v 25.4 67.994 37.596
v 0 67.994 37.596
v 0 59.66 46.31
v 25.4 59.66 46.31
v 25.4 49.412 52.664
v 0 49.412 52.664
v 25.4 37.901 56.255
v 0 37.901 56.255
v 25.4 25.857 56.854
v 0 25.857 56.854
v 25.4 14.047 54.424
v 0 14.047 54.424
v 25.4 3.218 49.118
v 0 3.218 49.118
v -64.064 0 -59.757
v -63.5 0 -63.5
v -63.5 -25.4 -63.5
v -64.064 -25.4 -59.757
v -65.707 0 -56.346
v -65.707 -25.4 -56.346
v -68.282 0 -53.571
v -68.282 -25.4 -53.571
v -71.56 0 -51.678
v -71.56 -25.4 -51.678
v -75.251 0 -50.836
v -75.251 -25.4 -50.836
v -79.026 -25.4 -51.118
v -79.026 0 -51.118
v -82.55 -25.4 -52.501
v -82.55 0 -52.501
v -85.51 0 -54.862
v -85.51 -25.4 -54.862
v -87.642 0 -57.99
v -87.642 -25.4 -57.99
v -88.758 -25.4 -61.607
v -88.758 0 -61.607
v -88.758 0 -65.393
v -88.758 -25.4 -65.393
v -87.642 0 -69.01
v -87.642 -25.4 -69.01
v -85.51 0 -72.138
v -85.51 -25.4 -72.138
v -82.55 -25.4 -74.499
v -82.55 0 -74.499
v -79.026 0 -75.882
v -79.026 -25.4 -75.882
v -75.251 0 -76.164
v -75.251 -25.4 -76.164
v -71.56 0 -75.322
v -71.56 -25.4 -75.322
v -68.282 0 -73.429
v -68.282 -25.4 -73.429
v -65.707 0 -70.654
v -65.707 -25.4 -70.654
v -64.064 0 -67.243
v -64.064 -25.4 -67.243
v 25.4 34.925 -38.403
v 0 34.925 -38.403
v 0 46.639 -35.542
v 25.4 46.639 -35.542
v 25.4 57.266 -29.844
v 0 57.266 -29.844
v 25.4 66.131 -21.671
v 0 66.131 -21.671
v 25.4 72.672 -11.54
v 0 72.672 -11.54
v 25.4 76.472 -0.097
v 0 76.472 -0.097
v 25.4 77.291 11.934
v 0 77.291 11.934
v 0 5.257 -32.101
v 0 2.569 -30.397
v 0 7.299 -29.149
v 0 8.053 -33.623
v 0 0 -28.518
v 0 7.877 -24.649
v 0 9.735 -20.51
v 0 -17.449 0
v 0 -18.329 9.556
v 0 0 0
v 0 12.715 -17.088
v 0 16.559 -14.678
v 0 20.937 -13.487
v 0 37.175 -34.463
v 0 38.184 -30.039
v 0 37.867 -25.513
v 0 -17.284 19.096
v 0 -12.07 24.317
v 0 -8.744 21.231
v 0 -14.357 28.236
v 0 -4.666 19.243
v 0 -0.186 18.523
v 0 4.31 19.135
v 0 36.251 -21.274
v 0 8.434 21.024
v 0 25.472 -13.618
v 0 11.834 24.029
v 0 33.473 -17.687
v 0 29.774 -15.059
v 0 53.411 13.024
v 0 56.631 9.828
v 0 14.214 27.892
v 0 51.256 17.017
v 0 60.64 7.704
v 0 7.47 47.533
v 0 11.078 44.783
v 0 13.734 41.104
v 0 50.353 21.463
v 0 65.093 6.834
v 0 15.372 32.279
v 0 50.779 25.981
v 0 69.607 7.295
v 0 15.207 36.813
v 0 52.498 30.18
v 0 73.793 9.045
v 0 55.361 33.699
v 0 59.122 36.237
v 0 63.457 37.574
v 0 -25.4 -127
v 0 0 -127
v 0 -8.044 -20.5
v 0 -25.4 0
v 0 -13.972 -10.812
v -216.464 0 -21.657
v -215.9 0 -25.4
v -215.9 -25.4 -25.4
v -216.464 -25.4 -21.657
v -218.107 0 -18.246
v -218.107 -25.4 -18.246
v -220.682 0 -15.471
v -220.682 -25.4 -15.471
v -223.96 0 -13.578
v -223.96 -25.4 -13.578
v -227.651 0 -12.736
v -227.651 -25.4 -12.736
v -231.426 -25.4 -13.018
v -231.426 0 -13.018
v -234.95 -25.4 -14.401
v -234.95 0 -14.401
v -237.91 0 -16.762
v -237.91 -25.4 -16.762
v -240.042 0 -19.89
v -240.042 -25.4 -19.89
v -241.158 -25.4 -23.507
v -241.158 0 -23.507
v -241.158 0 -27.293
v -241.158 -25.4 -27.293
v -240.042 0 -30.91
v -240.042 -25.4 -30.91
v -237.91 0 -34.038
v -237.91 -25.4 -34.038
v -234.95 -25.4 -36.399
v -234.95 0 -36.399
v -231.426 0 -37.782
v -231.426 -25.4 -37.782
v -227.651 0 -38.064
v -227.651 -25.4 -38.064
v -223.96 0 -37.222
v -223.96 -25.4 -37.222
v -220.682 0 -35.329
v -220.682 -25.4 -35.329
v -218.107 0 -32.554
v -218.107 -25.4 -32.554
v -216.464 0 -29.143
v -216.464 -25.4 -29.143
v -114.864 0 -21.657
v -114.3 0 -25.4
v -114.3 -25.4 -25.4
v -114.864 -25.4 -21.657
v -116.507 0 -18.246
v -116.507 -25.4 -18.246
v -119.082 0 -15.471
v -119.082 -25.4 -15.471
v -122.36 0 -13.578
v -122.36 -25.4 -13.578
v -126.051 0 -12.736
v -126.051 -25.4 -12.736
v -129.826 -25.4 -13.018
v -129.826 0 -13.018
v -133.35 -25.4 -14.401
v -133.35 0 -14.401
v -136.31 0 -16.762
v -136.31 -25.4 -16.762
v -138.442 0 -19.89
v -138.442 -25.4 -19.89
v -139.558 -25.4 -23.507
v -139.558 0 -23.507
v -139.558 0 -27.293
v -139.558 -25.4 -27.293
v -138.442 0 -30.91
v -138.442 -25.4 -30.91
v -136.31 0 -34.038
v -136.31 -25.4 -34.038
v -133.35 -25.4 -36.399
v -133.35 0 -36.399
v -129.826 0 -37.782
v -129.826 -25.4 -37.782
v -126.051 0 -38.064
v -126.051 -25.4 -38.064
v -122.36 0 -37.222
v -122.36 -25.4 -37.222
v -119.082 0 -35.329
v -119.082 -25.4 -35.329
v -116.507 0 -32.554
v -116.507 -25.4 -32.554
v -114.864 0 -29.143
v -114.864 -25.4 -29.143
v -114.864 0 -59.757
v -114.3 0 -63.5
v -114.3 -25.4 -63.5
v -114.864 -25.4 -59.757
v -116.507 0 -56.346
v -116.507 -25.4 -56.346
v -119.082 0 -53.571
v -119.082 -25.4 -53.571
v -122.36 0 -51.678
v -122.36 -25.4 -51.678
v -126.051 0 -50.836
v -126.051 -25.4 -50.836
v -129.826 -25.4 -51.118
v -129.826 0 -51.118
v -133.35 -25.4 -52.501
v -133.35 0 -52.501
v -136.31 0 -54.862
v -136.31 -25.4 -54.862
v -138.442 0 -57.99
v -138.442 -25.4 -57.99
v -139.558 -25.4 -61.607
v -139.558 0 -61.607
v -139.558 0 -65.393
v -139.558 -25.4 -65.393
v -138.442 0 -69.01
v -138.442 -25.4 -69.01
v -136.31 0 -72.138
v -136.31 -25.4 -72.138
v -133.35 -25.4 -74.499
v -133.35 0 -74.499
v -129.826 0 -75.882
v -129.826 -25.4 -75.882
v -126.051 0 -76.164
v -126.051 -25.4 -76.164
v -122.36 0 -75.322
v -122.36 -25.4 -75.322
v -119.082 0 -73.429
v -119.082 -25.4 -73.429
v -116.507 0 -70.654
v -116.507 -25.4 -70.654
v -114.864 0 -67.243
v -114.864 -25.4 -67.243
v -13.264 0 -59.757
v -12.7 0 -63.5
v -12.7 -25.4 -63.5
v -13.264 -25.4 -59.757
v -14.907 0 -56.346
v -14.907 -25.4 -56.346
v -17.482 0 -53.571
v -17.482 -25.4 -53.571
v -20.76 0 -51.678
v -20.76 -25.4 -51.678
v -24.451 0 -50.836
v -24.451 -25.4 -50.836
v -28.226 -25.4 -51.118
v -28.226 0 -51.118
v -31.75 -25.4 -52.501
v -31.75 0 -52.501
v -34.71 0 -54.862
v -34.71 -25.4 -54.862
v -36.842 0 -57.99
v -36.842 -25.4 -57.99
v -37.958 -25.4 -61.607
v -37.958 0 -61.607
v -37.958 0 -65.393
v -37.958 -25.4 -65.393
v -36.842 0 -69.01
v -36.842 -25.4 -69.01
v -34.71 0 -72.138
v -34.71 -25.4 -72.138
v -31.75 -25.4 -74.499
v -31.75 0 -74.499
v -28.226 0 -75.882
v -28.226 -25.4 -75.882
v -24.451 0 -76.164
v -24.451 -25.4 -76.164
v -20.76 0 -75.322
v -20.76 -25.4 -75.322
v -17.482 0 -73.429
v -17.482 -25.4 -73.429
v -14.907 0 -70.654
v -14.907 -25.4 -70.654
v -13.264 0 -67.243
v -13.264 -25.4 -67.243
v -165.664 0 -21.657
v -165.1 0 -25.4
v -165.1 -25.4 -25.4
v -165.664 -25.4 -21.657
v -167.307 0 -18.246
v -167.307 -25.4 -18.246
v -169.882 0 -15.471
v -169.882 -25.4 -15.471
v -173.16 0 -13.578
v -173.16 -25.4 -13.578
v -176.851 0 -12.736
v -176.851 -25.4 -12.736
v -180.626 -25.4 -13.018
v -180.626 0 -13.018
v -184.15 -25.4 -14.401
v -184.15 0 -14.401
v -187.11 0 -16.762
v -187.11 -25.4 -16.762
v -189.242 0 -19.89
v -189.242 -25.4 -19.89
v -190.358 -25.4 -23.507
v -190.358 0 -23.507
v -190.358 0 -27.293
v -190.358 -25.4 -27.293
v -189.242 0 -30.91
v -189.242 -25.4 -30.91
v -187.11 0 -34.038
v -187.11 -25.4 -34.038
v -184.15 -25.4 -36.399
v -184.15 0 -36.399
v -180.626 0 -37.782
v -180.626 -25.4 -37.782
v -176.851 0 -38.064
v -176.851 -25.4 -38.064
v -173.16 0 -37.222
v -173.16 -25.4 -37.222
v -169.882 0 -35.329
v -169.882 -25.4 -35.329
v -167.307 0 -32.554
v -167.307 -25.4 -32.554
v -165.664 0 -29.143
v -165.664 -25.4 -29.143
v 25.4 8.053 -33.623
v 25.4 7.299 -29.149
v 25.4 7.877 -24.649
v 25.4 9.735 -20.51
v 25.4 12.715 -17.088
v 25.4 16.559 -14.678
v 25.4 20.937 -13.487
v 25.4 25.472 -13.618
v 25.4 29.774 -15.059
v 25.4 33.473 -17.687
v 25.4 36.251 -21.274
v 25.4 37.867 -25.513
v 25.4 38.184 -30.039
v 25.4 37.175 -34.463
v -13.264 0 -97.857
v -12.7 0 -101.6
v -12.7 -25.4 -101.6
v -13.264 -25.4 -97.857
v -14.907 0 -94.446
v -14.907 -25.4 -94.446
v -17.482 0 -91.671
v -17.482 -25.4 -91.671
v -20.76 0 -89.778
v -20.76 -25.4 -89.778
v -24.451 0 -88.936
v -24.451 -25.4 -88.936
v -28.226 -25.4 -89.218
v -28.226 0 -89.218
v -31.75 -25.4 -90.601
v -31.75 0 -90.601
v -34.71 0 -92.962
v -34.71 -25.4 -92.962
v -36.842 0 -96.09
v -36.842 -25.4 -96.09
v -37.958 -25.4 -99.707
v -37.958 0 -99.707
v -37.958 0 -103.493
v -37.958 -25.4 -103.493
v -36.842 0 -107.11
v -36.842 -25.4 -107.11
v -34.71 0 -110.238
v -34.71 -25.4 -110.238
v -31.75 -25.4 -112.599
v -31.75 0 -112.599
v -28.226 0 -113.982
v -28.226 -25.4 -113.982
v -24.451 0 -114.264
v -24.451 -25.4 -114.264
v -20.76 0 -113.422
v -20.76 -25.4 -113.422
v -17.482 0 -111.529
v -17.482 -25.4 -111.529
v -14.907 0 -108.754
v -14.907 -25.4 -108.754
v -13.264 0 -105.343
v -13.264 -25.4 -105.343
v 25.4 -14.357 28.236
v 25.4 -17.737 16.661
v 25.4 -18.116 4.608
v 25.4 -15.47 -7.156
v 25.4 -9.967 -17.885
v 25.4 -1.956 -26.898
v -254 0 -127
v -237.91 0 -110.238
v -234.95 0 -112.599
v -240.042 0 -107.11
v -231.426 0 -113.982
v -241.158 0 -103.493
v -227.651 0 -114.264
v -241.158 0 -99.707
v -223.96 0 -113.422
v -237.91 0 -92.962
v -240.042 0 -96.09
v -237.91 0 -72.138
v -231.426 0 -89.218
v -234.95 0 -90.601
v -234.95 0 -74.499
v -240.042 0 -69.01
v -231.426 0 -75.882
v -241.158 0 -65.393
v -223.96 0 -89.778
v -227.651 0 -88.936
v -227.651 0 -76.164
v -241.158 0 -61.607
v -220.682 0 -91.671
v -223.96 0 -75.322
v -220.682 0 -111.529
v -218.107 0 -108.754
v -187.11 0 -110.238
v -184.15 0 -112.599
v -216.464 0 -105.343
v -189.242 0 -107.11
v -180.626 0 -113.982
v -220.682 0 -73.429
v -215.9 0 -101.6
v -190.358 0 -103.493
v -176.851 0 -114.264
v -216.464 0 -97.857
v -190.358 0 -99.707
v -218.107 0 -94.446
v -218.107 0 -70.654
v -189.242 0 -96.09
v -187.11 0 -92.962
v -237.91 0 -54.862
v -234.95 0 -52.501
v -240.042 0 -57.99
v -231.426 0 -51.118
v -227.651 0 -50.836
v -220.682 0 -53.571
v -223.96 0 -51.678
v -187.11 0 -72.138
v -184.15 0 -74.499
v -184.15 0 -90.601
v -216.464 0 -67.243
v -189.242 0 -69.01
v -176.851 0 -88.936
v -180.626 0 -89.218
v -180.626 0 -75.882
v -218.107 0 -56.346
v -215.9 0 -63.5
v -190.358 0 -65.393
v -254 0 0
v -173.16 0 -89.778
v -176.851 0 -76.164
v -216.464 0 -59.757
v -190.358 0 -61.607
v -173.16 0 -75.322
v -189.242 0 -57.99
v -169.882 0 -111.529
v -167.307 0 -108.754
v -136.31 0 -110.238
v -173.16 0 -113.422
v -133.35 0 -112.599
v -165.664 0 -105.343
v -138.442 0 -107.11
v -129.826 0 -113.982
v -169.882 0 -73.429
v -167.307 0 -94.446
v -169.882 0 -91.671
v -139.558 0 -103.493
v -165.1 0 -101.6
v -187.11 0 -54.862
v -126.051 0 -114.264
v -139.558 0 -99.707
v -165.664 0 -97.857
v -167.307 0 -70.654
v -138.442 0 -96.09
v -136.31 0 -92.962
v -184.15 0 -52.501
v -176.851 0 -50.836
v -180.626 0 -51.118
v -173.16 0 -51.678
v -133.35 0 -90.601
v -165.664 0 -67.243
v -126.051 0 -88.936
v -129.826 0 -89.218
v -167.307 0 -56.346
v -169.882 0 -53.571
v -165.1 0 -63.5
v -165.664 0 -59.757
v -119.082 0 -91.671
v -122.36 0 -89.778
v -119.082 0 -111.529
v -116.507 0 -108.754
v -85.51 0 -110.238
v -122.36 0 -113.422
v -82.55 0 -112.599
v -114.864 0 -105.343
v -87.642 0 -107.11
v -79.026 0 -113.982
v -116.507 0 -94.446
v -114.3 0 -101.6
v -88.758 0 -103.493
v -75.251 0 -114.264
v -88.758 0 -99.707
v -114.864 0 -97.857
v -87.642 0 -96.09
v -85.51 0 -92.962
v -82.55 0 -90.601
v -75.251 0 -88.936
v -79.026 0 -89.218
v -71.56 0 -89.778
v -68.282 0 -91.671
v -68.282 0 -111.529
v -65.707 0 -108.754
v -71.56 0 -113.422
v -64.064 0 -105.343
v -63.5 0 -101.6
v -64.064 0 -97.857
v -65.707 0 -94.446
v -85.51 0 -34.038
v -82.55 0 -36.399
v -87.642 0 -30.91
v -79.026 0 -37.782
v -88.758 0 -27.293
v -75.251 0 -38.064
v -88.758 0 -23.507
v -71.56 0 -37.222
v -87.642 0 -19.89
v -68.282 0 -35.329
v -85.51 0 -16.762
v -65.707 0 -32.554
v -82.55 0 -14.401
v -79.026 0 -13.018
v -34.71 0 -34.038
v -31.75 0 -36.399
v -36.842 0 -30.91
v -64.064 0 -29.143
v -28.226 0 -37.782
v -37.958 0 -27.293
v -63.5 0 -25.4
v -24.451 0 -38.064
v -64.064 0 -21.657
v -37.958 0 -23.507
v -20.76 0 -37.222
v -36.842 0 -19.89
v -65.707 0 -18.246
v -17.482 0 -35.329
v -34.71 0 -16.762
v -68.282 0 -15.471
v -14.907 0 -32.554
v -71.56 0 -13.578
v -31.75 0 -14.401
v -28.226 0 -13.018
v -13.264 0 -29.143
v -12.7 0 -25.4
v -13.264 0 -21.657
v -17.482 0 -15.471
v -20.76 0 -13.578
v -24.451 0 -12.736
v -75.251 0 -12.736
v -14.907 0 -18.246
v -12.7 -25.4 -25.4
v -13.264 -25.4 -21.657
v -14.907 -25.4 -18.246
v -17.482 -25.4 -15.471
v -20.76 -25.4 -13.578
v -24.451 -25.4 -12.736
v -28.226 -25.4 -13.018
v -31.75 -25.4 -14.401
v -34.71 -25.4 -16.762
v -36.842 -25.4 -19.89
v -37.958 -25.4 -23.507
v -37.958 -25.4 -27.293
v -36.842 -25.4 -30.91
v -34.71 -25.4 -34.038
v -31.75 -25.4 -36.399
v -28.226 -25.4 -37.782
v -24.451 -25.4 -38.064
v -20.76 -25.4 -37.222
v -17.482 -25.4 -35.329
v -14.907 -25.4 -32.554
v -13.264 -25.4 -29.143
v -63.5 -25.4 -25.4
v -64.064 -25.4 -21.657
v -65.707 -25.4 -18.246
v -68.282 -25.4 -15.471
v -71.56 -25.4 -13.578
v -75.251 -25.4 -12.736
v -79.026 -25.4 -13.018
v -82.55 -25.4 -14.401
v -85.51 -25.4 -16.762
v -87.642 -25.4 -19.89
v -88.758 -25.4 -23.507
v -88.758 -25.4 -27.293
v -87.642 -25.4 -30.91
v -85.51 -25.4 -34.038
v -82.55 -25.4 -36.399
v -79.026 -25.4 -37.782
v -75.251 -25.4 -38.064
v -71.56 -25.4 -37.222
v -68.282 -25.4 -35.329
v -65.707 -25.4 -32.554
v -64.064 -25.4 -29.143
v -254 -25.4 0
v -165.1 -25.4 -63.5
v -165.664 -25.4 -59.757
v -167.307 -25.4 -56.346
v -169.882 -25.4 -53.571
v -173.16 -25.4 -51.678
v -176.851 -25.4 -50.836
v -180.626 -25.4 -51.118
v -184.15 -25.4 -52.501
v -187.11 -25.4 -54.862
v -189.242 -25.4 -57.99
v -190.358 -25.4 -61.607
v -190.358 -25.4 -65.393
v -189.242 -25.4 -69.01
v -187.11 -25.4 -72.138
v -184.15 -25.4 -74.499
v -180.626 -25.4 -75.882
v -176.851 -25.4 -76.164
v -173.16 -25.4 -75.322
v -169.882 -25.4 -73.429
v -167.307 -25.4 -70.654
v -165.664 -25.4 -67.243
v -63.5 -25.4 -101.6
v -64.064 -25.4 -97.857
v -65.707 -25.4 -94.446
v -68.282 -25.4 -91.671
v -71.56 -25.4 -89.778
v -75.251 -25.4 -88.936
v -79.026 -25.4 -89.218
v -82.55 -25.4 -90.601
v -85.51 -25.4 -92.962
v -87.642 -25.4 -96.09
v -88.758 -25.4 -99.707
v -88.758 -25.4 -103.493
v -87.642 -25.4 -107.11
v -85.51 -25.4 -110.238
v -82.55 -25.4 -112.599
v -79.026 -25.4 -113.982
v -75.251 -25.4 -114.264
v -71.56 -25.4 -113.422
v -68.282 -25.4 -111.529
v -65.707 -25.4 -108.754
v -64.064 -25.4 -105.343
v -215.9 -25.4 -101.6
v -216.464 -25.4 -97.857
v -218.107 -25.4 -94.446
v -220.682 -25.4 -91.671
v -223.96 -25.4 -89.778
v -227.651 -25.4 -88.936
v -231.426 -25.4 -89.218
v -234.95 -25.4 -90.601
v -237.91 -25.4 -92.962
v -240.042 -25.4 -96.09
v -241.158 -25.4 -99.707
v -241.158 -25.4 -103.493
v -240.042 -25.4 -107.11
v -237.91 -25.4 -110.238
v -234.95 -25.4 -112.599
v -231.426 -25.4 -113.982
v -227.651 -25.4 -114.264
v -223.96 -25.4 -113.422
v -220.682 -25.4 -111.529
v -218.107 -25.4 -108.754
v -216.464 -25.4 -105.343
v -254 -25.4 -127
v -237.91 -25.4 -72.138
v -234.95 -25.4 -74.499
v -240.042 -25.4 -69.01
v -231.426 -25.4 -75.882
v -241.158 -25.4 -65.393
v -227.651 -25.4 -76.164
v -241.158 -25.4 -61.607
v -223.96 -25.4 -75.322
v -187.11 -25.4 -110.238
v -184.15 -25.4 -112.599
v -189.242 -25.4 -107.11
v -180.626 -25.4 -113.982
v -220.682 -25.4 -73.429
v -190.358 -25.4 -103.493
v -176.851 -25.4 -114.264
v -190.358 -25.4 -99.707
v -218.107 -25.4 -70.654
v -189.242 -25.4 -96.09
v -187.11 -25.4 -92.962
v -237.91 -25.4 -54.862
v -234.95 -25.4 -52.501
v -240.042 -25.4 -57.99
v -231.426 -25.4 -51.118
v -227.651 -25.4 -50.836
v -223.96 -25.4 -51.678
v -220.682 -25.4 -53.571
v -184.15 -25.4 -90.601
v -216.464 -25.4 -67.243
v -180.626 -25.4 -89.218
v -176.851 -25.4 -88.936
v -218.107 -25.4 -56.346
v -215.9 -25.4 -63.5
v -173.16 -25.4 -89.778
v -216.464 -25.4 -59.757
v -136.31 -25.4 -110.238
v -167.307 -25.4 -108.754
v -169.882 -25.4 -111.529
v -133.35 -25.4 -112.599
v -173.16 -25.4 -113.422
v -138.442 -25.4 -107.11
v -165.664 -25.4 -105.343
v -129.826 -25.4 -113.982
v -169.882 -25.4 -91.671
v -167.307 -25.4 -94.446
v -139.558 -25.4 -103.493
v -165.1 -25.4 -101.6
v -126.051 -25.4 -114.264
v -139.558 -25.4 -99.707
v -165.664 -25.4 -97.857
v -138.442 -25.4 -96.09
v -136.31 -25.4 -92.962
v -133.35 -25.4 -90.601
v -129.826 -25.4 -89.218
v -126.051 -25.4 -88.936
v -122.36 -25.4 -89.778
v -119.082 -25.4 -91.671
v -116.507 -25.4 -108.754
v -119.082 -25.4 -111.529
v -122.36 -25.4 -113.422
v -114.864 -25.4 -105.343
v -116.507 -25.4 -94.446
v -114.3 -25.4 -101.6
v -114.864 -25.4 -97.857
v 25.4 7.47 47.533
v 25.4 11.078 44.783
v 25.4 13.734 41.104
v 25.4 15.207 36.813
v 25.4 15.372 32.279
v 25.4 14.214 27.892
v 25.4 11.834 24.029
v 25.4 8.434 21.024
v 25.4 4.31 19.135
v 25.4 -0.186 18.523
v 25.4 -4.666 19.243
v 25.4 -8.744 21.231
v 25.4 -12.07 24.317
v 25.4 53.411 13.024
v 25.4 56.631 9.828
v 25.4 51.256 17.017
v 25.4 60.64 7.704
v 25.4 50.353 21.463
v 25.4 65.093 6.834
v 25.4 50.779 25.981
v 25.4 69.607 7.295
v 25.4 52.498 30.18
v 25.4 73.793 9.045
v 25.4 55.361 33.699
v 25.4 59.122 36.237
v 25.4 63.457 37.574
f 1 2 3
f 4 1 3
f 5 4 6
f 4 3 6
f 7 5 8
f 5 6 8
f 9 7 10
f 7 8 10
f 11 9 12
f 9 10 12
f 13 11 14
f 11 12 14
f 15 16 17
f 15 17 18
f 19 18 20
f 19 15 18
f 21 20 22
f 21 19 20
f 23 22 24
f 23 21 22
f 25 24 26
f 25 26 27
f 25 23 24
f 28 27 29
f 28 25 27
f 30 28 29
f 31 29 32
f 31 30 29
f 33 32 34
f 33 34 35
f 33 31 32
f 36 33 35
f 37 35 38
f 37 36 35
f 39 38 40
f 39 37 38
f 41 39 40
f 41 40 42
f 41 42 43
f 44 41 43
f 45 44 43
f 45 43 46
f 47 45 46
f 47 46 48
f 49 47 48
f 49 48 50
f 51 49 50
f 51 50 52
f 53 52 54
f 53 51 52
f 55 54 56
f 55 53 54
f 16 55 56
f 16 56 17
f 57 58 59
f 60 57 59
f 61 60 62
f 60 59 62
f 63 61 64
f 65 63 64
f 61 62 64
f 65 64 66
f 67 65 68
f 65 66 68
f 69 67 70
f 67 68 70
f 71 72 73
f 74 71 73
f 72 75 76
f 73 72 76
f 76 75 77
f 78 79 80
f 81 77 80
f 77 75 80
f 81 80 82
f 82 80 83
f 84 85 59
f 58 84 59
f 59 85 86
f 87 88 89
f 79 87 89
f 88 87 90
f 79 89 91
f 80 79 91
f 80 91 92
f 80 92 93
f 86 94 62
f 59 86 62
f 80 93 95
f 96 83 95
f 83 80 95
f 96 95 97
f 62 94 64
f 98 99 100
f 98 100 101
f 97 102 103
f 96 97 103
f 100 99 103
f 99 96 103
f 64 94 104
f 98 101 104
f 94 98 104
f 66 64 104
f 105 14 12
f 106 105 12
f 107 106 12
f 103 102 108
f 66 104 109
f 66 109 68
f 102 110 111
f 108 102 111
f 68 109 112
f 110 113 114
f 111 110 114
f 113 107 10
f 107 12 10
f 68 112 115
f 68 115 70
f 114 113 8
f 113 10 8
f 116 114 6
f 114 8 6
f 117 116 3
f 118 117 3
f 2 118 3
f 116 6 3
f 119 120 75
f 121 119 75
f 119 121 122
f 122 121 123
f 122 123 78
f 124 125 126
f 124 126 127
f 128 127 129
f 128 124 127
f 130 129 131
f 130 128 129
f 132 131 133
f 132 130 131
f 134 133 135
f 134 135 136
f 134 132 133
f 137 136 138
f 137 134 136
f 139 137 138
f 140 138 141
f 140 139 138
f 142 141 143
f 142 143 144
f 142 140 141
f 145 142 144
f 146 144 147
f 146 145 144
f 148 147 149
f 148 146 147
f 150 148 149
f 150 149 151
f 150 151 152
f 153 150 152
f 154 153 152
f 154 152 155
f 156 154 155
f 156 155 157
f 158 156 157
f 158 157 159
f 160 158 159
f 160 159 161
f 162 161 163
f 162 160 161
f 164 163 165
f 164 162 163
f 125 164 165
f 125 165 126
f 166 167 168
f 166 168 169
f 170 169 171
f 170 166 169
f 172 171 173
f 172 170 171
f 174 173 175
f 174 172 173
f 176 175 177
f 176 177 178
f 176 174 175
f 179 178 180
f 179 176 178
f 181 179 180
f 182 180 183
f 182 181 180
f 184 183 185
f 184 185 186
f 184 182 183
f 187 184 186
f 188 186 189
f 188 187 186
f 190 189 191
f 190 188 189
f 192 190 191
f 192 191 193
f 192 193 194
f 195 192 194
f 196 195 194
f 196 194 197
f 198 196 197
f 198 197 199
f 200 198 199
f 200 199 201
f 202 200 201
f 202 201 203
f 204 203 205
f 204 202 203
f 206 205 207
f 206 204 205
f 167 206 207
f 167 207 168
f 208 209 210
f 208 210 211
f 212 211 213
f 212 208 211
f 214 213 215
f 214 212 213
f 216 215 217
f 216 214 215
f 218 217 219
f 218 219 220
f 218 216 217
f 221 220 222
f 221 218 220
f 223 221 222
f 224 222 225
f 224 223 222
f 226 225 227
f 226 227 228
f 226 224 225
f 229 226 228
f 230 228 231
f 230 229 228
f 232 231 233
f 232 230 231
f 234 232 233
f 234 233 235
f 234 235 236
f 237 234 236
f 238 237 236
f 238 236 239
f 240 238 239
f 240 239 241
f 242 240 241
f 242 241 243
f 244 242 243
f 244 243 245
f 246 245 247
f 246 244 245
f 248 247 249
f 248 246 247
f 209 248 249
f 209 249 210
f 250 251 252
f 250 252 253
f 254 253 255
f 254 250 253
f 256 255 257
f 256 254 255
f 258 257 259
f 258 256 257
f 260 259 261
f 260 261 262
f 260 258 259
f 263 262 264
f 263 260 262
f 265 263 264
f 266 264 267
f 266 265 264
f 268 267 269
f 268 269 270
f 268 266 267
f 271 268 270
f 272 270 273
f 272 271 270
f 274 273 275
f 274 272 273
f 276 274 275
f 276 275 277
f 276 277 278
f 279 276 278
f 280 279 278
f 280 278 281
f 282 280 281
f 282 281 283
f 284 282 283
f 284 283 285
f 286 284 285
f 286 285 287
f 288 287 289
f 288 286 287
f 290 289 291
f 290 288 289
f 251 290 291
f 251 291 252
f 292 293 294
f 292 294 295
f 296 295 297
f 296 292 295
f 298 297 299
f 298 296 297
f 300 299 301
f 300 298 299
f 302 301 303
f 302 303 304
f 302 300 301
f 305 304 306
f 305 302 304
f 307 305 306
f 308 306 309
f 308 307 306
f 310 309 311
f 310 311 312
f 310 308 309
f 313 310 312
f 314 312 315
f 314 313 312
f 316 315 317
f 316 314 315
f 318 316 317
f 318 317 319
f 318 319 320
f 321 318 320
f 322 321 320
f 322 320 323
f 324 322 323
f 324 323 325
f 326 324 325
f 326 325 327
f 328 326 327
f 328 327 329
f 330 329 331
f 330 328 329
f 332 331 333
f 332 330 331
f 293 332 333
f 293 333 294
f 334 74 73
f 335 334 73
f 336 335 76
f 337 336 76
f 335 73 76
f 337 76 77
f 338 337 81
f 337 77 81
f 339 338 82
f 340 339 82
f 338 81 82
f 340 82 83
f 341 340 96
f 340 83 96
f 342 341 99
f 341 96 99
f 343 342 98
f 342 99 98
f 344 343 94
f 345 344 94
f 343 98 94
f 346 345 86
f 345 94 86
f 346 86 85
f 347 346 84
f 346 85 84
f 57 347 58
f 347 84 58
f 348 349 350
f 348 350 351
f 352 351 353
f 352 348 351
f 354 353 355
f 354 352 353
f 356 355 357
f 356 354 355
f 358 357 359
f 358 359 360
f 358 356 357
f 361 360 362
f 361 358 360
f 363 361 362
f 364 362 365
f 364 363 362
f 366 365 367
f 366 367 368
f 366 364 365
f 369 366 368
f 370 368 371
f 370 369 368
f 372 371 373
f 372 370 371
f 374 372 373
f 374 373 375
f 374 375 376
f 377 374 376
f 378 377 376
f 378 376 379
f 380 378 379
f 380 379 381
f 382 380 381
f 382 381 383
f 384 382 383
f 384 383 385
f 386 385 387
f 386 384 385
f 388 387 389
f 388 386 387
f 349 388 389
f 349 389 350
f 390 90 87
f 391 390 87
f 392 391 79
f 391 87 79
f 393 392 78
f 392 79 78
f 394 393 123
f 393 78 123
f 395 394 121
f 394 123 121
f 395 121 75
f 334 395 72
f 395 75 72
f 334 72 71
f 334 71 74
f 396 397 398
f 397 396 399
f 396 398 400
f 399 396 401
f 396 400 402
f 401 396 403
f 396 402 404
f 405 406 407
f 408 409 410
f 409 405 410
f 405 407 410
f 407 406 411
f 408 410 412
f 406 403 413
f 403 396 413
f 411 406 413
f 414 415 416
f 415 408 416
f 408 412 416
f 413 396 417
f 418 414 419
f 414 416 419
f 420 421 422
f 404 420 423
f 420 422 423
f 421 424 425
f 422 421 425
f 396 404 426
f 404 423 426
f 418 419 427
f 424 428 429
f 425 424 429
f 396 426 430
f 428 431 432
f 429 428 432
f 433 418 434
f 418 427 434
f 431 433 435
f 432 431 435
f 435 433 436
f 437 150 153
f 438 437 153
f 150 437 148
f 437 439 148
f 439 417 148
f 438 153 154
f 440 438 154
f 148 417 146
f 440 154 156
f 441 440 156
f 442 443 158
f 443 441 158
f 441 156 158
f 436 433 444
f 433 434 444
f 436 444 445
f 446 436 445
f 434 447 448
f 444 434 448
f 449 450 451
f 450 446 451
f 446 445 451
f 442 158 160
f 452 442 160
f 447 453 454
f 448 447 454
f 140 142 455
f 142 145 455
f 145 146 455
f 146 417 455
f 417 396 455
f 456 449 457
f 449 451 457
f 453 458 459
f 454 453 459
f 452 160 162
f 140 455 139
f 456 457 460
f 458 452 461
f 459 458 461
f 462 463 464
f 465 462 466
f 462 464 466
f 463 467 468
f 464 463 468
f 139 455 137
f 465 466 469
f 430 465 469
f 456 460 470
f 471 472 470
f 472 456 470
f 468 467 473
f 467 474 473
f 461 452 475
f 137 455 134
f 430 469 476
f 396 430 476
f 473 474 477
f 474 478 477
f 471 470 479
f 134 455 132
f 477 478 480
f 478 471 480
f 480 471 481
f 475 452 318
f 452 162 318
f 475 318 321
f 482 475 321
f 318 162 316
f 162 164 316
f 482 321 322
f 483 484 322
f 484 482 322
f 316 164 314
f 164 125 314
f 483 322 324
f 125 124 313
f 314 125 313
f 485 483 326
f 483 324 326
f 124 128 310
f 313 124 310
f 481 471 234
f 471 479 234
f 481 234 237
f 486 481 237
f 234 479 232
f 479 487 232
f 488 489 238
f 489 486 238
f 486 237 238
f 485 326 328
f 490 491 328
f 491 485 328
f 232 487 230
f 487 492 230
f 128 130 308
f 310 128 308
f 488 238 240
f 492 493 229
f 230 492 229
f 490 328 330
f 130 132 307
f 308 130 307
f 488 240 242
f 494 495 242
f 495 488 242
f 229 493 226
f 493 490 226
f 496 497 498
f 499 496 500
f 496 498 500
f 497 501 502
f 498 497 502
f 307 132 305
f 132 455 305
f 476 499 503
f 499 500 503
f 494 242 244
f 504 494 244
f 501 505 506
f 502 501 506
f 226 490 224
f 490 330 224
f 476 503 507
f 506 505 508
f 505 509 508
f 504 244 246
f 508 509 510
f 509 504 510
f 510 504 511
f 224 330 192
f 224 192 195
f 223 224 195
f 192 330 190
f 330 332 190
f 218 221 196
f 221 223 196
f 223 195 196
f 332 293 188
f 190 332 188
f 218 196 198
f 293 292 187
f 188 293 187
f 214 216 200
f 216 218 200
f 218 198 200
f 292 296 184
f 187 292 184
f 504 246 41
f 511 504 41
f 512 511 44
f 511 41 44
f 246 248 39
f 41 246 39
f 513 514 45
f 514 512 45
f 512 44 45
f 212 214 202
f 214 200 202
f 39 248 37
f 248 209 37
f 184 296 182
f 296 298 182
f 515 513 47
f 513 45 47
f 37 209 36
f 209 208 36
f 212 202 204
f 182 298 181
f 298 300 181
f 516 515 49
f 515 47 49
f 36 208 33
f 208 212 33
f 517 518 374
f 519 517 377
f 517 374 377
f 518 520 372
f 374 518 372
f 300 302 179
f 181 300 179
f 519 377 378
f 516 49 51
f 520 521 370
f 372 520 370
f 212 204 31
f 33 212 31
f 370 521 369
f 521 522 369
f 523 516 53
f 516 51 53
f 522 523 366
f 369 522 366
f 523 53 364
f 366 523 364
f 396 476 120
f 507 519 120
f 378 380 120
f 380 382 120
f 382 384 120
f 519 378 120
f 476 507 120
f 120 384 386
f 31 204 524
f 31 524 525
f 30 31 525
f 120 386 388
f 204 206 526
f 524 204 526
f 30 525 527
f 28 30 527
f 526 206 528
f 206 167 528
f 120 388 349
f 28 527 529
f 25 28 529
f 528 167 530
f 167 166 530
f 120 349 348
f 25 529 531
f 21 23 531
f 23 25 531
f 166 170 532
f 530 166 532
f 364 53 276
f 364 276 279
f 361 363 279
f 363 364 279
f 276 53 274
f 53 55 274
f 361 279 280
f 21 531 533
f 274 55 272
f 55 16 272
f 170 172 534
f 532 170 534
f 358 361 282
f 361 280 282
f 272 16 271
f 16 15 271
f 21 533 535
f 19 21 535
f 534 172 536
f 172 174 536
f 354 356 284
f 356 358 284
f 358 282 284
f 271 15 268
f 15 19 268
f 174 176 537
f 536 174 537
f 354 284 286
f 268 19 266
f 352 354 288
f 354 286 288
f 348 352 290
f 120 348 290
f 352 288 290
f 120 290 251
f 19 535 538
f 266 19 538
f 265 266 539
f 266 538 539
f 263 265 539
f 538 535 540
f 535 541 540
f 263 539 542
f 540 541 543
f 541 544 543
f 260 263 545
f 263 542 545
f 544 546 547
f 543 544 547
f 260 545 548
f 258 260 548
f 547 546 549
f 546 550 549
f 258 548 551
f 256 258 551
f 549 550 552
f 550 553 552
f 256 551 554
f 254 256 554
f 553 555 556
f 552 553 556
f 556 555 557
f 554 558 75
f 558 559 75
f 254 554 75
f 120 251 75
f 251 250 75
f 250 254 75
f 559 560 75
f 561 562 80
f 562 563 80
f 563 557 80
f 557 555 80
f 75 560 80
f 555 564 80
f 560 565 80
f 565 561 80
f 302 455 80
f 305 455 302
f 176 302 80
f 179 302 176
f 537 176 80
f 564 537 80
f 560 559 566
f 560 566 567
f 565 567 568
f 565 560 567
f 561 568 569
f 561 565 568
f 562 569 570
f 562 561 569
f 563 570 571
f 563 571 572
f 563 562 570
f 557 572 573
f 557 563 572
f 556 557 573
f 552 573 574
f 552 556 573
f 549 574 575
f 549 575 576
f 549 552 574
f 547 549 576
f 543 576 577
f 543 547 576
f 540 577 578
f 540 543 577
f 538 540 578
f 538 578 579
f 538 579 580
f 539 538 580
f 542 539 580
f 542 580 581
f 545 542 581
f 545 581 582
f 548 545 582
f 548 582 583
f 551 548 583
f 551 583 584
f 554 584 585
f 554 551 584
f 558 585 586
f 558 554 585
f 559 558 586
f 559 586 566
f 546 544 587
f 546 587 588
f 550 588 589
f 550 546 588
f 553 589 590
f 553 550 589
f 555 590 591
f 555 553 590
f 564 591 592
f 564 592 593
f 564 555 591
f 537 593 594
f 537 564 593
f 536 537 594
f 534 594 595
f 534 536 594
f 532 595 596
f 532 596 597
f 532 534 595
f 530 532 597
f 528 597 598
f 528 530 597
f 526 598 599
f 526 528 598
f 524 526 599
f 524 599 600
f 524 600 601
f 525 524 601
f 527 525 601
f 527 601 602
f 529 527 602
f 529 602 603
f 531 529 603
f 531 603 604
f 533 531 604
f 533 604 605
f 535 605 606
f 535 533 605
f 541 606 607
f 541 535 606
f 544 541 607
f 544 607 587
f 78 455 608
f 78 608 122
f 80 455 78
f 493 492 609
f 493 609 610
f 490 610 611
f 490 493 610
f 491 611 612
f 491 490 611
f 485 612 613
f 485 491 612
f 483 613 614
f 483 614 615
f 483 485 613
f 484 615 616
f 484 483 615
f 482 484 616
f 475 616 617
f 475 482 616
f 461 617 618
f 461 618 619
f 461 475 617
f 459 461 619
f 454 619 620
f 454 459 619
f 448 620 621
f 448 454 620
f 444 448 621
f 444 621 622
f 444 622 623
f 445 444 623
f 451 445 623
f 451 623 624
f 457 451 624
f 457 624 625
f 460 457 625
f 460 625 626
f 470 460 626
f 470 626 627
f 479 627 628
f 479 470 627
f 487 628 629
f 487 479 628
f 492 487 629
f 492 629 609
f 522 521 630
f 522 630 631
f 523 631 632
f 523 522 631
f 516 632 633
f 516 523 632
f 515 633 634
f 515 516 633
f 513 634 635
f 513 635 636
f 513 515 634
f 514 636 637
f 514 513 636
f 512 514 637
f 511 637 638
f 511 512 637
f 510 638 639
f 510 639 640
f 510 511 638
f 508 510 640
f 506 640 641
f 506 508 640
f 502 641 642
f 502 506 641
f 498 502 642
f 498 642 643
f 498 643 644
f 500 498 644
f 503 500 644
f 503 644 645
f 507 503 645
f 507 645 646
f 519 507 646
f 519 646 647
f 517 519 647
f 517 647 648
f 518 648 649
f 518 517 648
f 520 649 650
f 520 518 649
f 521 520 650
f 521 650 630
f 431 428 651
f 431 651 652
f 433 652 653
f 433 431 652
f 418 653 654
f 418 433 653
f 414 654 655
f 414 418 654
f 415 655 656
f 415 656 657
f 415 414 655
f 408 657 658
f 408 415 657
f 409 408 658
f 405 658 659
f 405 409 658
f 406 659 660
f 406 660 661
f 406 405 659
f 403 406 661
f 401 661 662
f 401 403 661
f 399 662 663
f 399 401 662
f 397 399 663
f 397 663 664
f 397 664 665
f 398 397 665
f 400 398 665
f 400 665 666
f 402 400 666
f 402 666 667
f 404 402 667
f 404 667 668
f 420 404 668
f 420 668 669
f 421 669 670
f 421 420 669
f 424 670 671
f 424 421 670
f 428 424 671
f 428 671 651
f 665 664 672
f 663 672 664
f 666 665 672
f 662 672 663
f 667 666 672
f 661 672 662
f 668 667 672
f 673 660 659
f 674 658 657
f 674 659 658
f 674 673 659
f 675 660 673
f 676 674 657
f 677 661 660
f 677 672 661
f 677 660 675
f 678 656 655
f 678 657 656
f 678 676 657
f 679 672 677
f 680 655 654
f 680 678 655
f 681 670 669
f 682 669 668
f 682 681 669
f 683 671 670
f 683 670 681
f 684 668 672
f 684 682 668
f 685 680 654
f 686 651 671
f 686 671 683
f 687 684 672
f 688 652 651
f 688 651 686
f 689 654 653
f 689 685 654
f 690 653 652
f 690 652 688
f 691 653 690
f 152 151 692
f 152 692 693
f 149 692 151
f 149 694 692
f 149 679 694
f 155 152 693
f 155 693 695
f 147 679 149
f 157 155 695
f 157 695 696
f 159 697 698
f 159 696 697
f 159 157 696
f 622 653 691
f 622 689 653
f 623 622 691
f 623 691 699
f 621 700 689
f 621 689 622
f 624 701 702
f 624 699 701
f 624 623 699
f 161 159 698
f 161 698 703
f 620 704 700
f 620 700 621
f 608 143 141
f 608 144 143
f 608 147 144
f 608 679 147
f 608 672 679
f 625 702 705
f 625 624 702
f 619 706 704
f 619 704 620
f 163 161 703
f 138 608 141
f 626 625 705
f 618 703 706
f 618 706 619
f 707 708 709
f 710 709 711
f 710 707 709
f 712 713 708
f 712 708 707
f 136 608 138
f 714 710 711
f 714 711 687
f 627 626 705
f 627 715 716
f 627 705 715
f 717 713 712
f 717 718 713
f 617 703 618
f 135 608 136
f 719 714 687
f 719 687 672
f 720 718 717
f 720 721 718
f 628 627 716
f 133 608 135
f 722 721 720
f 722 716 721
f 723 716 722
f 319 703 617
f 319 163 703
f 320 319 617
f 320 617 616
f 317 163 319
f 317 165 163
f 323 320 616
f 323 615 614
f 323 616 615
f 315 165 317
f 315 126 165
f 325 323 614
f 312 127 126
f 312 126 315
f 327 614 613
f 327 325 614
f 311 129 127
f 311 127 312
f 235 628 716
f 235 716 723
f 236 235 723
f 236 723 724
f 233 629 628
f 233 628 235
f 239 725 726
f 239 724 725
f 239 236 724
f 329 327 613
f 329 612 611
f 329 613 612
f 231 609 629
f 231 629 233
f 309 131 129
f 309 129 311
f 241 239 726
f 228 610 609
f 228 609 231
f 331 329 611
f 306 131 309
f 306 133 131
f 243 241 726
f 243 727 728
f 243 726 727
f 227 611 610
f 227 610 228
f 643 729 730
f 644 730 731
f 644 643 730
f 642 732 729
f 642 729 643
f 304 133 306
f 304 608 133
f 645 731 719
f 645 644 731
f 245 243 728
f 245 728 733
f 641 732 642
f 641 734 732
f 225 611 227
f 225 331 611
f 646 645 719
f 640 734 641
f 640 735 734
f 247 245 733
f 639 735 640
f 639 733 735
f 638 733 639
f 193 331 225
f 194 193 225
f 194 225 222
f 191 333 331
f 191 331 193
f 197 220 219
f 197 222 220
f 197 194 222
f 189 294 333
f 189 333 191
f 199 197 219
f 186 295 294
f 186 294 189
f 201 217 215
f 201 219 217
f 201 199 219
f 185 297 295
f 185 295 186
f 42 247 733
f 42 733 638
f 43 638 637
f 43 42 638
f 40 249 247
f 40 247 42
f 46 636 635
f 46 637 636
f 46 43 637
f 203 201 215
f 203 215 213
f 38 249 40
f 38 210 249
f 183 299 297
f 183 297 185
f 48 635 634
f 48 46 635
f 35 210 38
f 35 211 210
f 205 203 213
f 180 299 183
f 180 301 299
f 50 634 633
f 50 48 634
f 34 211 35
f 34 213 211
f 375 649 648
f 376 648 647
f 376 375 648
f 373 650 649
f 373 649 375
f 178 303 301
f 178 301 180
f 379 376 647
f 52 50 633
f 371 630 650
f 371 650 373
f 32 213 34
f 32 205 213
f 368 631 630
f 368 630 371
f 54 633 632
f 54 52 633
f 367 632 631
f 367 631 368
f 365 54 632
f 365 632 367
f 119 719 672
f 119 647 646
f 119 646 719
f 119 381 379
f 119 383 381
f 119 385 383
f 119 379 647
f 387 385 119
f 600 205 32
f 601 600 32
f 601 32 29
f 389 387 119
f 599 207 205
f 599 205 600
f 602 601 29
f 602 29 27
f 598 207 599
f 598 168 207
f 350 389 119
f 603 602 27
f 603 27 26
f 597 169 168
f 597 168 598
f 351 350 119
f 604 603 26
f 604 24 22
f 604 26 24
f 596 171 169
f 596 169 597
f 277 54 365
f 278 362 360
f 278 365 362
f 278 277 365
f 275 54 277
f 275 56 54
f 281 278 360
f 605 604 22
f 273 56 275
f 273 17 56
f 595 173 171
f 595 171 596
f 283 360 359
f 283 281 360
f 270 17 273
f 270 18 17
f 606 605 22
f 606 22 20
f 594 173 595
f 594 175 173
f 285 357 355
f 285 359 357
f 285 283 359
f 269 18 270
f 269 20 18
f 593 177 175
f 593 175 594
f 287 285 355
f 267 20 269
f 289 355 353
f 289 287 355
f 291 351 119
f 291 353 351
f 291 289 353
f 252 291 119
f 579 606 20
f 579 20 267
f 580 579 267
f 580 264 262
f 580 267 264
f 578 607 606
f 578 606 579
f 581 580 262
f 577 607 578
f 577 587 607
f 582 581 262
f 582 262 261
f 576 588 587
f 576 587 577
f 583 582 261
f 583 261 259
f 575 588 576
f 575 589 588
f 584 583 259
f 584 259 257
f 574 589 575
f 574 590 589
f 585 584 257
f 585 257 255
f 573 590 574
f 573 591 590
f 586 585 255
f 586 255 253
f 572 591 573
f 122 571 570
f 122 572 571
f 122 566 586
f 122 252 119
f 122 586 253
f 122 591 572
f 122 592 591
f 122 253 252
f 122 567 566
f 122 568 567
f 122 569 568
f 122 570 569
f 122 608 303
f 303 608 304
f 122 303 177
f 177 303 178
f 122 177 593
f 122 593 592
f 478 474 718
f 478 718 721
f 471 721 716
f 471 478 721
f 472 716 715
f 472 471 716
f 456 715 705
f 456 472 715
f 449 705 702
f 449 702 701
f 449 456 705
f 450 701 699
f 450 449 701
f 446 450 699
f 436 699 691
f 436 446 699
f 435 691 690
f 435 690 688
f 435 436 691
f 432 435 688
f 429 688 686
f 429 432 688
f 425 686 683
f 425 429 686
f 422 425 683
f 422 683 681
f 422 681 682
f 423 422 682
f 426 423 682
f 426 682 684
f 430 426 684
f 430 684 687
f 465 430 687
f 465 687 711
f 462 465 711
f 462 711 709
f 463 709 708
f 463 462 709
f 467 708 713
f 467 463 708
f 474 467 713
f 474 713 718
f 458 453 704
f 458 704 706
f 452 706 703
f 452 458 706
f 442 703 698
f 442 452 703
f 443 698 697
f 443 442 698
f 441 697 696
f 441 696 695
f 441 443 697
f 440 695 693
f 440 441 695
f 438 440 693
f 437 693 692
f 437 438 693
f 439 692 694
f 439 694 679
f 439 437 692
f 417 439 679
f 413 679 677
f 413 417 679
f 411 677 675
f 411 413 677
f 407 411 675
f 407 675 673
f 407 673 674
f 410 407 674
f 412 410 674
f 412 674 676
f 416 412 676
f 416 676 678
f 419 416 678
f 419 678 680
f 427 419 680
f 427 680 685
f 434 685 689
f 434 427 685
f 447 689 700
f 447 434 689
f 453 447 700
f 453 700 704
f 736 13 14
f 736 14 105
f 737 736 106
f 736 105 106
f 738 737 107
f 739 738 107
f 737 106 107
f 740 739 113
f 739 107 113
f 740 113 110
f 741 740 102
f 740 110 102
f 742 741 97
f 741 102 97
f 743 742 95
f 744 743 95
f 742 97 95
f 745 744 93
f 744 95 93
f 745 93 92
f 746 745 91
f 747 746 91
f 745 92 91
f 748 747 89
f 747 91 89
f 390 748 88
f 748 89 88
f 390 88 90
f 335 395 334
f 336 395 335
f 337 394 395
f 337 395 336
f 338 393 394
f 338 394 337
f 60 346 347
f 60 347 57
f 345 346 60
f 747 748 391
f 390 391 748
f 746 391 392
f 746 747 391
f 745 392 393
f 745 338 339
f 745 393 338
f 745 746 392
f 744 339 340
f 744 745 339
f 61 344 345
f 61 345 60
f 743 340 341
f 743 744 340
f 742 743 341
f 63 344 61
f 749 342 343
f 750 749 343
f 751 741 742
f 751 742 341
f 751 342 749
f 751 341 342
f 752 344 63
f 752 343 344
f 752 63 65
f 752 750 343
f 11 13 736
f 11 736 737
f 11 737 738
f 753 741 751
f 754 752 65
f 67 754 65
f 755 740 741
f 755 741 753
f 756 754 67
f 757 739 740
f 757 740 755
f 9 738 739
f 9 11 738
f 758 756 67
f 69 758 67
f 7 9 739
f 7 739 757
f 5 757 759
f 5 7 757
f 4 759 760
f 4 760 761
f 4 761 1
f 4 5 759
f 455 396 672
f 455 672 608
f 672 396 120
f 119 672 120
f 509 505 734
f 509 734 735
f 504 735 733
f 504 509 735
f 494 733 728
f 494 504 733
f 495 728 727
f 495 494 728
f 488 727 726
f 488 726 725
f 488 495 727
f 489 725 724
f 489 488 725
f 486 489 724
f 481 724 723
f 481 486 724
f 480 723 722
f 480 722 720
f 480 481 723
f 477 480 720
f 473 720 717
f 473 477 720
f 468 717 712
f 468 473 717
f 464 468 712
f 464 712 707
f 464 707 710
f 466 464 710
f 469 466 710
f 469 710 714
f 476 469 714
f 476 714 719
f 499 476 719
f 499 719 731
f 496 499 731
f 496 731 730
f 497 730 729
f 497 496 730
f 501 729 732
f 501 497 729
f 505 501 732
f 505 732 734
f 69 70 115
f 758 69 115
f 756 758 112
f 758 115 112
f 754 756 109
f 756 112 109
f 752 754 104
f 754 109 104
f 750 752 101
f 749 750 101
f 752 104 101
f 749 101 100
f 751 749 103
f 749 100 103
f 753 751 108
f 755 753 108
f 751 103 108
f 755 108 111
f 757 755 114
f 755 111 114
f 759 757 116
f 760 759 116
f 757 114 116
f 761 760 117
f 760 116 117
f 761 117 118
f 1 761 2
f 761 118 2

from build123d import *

# Parameters (mm, degrees)
F0_W     = 254
F0_H     = 127
F0_R     = 12.7
F1_DEPTH = 25.4
F3_DEPTH = 25.4


with BuildPart() as f1:
    # F0 (on Front) → F1 (new body)
    with BuildSketch(Plane.XZ):
        with Locations((-127, -63.5)):
            Rectangle(F0_W, F0_H)
        with Locations((-228.6, -101.6)):
            Circle(F0_R, mode=Mode.SUBTRACT)
        with Locations((-177.8, -101.6)):
            Circle(F0_R, mode=Mode.SUBTRACT)
        with Locations((-127, -101.6)):
            Circle(F0_R, mode=Mode.SUBTRACT)
        with Locations((-76.2, -101.6)):
            Circle(F0_R, mode=Mode.SUBTRACT)
        with Locations((-25.4, -101.6)):
            Circle(F0_R, mode=Mode.SUBTRACT)
        with Locations((-228.6, -63.5)):
            Circle(F0_R, mode=Mode.SUBTRACT)
        with Locations((-177.8, -63.5)):
            Circle(F0_R, mode=Mode.SUBTRACT)
        with Locations((-228.6, -25.4)):
            Circle(F0_R, mode=Mode.SUBTRACT)
        with Locations((-177.8, -25.4)):
            Circle(F0_R, mode=Mode.SUBTRACT)
        with Locations((-127, -63.5)):
            Circle(F0_R, mode=Mode.SUBTRACT)
        with Locations((-76.2, -63.5)):
            Circle(F0_R, mode=Mode.SUBTRACT)
        with Locations((-25.4, -63.5)):
            Circle(F0_R, mode=Mode.SUBTRACT)
        with Locations((-127, -25.4)):
            Circle(F0_R, mode=Mode.SUBTRACT)
        with Locations((-76.2, -25.4)):
            Circle(F0_R, mode=Mode.SUBTRACT)
        with Locations((-25.4, -25.4)):
            Circle(F0_R, mode=Mode.SUBTRACT)
    extrude(amount=F1_DEPTH)

    # F2 (on Right) → F3 (join)
    with BuildSketch(Plane.YZ):
        with BuildLine():
            ThreePointArc((3.218499, 49.117664), (11.833529, 24.029421), (-14.357061, 28.235564))
            ThreePointArc((-14.357061, 28.235564), (-15.469696, -7.155973), (8.052648, -33.622899))
            ThreePointArc((8.052648, -33.622899), (25.472188, -13.617942), (34.924857, -38.40273))
            ThreePointArc((34.924857, -38.40273), (66.131145, -21.670532), (77.291002, 11.933878))
            ThreePointArc((77.291002, 11.933878), (51.256432, 17.017165), (67.994353, 37.59581))
            ThreePointArc((67.994353, 37.59581), (37.900701, 56.255149), (3.218499, 49.117664))
        make_face()
    extrude(amount=F3_DEPTH)


solid = f1.part
